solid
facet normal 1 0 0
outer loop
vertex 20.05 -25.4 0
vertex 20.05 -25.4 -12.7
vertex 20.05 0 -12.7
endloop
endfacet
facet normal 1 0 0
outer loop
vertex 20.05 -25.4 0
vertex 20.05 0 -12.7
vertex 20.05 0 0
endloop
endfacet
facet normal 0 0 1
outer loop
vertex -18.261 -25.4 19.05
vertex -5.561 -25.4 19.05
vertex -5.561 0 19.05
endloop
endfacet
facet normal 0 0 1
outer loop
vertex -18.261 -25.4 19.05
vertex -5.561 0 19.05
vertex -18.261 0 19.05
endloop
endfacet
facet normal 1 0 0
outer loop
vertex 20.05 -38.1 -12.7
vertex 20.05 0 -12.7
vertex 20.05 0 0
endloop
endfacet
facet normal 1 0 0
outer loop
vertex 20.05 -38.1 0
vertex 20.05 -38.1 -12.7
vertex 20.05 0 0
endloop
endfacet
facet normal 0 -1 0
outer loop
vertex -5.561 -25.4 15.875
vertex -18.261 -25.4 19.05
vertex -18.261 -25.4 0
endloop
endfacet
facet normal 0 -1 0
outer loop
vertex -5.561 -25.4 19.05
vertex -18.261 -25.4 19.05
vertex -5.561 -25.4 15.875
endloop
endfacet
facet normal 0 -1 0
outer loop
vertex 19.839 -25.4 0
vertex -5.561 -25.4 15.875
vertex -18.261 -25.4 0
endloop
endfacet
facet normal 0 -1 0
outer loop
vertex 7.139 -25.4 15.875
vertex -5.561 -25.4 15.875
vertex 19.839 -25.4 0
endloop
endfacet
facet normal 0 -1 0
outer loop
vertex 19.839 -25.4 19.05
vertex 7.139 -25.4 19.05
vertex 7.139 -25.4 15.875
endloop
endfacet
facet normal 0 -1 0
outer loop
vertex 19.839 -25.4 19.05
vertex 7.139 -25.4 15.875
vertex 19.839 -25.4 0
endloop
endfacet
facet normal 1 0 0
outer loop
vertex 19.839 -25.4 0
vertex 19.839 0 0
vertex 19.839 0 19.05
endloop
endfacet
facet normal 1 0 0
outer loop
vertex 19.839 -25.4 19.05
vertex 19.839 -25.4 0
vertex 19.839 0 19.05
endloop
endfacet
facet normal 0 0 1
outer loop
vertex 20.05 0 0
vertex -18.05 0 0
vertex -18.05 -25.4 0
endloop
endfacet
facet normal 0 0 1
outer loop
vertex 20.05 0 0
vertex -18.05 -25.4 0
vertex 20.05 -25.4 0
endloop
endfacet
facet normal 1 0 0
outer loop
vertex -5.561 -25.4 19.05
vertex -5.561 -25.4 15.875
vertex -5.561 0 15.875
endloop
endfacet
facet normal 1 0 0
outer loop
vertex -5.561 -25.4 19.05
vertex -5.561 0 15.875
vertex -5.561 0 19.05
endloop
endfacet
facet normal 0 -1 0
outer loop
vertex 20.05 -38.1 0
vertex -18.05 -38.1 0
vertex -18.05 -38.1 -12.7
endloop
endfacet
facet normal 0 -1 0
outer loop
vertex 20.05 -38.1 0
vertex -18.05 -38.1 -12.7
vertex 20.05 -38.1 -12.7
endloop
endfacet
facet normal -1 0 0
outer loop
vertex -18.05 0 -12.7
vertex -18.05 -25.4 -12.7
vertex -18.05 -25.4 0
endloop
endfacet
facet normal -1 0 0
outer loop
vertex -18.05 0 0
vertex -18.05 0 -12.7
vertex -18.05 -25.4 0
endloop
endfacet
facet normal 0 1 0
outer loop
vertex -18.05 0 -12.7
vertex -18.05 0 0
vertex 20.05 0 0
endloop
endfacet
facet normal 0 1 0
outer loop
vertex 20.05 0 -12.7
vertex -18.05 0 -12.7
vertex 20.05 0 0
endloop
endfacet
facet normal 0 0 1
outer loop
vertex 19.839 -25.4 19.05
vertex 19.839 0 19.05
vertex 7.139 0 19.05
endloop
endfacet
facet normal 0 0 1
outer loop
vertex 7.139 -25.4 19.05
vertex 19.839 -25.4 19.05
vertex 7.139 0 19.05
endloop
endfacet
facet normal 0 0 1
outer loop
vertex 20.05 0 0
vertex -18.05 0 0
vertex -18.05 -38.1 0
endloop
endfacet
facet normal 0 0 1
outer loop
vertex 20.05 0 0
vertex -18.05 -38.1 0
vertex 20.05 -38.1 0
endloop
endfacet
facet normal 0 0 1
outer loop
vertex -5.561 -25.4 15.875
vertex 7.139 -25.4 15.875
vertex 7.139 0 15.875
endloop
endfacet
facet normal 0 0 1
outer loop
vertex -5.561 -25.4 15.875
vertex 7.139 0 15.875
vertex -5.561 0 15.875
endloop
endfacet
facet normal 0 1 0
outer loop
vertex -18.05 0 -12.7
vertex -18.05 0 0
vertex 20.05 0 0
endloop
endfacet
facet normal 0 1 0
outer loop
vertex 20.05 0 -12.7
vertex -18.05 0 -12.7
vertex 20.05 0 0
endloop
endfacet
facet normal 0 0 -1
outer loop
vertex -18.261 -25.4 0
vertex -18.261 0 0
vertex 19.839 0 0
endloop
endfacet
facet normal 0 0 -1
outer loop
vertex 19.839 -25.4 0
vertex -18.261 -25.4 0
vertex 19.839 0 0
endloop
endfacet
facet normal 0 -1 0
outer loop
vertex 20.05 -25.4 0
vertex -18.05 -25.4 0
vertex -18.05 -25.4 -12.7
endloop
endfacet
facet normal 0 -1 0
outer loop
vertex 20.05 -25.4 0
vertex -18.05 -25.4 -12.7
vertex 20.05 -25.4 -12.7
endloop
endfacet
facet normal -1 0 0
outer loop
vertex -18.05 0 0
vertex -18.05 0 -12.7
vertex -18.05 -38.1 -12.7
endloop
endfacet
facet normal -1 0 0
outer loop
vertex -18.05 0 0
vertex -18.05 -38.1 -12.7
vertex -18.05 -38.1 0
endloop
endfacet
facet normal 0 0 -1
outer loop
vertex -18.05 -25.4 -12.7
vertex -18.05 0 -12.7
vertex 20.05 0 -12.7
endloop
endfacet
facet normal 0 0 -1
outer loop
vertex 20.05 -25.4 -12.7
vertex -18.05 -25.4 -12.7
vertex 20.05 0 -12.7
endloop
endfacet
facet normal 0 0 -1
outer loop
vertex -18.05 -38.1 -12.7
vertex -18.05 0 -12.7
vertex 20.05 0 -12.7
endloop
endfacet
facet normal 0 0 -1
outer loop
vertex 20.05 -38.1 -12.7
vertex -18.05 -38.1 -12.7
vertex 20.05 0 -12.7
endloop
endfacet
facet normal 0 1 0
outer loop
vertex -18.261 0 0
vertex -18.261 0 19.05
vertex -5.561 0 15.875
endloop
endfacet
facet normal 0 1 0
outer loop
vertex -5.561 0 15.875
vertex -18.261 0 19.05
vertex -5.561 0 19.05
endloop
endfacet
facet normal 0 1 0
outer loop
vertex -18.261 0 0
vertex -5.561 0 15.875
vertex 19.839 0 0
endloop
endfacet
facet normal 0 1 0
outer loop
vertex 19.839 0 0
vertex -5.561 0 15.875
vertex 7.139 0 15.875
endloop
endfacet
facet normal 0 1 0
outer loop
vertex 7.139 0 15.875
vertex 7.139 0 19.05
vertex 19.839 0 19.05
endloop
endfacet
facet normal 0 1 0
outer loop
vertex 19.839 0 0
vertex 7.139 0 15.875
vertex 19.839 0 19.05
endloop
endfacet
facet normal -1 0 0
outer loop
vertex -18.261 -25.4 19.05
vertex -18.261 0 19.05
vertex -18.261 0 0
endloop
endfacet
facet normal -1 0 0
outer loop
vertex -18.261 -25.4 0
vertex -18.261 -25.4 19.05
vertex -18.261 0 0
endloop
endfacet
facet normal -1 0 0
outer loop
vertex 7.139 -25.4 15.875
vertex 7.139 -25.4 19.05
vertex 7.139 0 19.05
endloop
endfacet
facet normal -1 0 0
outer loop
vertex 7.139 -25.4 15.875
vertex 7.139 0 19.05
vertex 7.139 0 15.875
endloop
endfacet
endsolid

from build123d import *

# Parameters (mm, degrees)
F2_DEPTH = 25.4
F1_W     = 38.1
F1_H     = 12.7
F3_DEPTH = 38.1


with BuildPart() as f2:
    # F0 (on Front) → F2 (new body)
    with BuildSketch(Plane.XZ):
        Polygon((-5.5608570904, 19.05), (-18.2608570904, 19.05), (-18.2608570904, 0), (19.8391429096, 0), (19.8391429096, 19.05), (7.1391429096, 19.05), (7.1391429096, 15.875), (-5.5608570904, 15.875), align=None)
    extrude(amount=F2_DEPTH)


with BuildPart() as f2b:
    # F1 (on Front) → F2, piece 2 (new body)
    with BuildSketch(Plane.XZ):
        with Locations((1.0002495229, -6.35)):
            Rectangle(F1_W, F1_H)
    extrude(amount=F2_DEPTH)


with BuildPart() as f3:
    # F1 (on Front) → F3 (new body)
    with BuildSketch(Plane.XZ):
        with Locations((1.0002495229, -6.35)):
            Rectangle(F1_W, F1_H)
    extrude(amount=F3_DEPTH)


solid = Compound([f2.part, f2b.part, f3.part])
